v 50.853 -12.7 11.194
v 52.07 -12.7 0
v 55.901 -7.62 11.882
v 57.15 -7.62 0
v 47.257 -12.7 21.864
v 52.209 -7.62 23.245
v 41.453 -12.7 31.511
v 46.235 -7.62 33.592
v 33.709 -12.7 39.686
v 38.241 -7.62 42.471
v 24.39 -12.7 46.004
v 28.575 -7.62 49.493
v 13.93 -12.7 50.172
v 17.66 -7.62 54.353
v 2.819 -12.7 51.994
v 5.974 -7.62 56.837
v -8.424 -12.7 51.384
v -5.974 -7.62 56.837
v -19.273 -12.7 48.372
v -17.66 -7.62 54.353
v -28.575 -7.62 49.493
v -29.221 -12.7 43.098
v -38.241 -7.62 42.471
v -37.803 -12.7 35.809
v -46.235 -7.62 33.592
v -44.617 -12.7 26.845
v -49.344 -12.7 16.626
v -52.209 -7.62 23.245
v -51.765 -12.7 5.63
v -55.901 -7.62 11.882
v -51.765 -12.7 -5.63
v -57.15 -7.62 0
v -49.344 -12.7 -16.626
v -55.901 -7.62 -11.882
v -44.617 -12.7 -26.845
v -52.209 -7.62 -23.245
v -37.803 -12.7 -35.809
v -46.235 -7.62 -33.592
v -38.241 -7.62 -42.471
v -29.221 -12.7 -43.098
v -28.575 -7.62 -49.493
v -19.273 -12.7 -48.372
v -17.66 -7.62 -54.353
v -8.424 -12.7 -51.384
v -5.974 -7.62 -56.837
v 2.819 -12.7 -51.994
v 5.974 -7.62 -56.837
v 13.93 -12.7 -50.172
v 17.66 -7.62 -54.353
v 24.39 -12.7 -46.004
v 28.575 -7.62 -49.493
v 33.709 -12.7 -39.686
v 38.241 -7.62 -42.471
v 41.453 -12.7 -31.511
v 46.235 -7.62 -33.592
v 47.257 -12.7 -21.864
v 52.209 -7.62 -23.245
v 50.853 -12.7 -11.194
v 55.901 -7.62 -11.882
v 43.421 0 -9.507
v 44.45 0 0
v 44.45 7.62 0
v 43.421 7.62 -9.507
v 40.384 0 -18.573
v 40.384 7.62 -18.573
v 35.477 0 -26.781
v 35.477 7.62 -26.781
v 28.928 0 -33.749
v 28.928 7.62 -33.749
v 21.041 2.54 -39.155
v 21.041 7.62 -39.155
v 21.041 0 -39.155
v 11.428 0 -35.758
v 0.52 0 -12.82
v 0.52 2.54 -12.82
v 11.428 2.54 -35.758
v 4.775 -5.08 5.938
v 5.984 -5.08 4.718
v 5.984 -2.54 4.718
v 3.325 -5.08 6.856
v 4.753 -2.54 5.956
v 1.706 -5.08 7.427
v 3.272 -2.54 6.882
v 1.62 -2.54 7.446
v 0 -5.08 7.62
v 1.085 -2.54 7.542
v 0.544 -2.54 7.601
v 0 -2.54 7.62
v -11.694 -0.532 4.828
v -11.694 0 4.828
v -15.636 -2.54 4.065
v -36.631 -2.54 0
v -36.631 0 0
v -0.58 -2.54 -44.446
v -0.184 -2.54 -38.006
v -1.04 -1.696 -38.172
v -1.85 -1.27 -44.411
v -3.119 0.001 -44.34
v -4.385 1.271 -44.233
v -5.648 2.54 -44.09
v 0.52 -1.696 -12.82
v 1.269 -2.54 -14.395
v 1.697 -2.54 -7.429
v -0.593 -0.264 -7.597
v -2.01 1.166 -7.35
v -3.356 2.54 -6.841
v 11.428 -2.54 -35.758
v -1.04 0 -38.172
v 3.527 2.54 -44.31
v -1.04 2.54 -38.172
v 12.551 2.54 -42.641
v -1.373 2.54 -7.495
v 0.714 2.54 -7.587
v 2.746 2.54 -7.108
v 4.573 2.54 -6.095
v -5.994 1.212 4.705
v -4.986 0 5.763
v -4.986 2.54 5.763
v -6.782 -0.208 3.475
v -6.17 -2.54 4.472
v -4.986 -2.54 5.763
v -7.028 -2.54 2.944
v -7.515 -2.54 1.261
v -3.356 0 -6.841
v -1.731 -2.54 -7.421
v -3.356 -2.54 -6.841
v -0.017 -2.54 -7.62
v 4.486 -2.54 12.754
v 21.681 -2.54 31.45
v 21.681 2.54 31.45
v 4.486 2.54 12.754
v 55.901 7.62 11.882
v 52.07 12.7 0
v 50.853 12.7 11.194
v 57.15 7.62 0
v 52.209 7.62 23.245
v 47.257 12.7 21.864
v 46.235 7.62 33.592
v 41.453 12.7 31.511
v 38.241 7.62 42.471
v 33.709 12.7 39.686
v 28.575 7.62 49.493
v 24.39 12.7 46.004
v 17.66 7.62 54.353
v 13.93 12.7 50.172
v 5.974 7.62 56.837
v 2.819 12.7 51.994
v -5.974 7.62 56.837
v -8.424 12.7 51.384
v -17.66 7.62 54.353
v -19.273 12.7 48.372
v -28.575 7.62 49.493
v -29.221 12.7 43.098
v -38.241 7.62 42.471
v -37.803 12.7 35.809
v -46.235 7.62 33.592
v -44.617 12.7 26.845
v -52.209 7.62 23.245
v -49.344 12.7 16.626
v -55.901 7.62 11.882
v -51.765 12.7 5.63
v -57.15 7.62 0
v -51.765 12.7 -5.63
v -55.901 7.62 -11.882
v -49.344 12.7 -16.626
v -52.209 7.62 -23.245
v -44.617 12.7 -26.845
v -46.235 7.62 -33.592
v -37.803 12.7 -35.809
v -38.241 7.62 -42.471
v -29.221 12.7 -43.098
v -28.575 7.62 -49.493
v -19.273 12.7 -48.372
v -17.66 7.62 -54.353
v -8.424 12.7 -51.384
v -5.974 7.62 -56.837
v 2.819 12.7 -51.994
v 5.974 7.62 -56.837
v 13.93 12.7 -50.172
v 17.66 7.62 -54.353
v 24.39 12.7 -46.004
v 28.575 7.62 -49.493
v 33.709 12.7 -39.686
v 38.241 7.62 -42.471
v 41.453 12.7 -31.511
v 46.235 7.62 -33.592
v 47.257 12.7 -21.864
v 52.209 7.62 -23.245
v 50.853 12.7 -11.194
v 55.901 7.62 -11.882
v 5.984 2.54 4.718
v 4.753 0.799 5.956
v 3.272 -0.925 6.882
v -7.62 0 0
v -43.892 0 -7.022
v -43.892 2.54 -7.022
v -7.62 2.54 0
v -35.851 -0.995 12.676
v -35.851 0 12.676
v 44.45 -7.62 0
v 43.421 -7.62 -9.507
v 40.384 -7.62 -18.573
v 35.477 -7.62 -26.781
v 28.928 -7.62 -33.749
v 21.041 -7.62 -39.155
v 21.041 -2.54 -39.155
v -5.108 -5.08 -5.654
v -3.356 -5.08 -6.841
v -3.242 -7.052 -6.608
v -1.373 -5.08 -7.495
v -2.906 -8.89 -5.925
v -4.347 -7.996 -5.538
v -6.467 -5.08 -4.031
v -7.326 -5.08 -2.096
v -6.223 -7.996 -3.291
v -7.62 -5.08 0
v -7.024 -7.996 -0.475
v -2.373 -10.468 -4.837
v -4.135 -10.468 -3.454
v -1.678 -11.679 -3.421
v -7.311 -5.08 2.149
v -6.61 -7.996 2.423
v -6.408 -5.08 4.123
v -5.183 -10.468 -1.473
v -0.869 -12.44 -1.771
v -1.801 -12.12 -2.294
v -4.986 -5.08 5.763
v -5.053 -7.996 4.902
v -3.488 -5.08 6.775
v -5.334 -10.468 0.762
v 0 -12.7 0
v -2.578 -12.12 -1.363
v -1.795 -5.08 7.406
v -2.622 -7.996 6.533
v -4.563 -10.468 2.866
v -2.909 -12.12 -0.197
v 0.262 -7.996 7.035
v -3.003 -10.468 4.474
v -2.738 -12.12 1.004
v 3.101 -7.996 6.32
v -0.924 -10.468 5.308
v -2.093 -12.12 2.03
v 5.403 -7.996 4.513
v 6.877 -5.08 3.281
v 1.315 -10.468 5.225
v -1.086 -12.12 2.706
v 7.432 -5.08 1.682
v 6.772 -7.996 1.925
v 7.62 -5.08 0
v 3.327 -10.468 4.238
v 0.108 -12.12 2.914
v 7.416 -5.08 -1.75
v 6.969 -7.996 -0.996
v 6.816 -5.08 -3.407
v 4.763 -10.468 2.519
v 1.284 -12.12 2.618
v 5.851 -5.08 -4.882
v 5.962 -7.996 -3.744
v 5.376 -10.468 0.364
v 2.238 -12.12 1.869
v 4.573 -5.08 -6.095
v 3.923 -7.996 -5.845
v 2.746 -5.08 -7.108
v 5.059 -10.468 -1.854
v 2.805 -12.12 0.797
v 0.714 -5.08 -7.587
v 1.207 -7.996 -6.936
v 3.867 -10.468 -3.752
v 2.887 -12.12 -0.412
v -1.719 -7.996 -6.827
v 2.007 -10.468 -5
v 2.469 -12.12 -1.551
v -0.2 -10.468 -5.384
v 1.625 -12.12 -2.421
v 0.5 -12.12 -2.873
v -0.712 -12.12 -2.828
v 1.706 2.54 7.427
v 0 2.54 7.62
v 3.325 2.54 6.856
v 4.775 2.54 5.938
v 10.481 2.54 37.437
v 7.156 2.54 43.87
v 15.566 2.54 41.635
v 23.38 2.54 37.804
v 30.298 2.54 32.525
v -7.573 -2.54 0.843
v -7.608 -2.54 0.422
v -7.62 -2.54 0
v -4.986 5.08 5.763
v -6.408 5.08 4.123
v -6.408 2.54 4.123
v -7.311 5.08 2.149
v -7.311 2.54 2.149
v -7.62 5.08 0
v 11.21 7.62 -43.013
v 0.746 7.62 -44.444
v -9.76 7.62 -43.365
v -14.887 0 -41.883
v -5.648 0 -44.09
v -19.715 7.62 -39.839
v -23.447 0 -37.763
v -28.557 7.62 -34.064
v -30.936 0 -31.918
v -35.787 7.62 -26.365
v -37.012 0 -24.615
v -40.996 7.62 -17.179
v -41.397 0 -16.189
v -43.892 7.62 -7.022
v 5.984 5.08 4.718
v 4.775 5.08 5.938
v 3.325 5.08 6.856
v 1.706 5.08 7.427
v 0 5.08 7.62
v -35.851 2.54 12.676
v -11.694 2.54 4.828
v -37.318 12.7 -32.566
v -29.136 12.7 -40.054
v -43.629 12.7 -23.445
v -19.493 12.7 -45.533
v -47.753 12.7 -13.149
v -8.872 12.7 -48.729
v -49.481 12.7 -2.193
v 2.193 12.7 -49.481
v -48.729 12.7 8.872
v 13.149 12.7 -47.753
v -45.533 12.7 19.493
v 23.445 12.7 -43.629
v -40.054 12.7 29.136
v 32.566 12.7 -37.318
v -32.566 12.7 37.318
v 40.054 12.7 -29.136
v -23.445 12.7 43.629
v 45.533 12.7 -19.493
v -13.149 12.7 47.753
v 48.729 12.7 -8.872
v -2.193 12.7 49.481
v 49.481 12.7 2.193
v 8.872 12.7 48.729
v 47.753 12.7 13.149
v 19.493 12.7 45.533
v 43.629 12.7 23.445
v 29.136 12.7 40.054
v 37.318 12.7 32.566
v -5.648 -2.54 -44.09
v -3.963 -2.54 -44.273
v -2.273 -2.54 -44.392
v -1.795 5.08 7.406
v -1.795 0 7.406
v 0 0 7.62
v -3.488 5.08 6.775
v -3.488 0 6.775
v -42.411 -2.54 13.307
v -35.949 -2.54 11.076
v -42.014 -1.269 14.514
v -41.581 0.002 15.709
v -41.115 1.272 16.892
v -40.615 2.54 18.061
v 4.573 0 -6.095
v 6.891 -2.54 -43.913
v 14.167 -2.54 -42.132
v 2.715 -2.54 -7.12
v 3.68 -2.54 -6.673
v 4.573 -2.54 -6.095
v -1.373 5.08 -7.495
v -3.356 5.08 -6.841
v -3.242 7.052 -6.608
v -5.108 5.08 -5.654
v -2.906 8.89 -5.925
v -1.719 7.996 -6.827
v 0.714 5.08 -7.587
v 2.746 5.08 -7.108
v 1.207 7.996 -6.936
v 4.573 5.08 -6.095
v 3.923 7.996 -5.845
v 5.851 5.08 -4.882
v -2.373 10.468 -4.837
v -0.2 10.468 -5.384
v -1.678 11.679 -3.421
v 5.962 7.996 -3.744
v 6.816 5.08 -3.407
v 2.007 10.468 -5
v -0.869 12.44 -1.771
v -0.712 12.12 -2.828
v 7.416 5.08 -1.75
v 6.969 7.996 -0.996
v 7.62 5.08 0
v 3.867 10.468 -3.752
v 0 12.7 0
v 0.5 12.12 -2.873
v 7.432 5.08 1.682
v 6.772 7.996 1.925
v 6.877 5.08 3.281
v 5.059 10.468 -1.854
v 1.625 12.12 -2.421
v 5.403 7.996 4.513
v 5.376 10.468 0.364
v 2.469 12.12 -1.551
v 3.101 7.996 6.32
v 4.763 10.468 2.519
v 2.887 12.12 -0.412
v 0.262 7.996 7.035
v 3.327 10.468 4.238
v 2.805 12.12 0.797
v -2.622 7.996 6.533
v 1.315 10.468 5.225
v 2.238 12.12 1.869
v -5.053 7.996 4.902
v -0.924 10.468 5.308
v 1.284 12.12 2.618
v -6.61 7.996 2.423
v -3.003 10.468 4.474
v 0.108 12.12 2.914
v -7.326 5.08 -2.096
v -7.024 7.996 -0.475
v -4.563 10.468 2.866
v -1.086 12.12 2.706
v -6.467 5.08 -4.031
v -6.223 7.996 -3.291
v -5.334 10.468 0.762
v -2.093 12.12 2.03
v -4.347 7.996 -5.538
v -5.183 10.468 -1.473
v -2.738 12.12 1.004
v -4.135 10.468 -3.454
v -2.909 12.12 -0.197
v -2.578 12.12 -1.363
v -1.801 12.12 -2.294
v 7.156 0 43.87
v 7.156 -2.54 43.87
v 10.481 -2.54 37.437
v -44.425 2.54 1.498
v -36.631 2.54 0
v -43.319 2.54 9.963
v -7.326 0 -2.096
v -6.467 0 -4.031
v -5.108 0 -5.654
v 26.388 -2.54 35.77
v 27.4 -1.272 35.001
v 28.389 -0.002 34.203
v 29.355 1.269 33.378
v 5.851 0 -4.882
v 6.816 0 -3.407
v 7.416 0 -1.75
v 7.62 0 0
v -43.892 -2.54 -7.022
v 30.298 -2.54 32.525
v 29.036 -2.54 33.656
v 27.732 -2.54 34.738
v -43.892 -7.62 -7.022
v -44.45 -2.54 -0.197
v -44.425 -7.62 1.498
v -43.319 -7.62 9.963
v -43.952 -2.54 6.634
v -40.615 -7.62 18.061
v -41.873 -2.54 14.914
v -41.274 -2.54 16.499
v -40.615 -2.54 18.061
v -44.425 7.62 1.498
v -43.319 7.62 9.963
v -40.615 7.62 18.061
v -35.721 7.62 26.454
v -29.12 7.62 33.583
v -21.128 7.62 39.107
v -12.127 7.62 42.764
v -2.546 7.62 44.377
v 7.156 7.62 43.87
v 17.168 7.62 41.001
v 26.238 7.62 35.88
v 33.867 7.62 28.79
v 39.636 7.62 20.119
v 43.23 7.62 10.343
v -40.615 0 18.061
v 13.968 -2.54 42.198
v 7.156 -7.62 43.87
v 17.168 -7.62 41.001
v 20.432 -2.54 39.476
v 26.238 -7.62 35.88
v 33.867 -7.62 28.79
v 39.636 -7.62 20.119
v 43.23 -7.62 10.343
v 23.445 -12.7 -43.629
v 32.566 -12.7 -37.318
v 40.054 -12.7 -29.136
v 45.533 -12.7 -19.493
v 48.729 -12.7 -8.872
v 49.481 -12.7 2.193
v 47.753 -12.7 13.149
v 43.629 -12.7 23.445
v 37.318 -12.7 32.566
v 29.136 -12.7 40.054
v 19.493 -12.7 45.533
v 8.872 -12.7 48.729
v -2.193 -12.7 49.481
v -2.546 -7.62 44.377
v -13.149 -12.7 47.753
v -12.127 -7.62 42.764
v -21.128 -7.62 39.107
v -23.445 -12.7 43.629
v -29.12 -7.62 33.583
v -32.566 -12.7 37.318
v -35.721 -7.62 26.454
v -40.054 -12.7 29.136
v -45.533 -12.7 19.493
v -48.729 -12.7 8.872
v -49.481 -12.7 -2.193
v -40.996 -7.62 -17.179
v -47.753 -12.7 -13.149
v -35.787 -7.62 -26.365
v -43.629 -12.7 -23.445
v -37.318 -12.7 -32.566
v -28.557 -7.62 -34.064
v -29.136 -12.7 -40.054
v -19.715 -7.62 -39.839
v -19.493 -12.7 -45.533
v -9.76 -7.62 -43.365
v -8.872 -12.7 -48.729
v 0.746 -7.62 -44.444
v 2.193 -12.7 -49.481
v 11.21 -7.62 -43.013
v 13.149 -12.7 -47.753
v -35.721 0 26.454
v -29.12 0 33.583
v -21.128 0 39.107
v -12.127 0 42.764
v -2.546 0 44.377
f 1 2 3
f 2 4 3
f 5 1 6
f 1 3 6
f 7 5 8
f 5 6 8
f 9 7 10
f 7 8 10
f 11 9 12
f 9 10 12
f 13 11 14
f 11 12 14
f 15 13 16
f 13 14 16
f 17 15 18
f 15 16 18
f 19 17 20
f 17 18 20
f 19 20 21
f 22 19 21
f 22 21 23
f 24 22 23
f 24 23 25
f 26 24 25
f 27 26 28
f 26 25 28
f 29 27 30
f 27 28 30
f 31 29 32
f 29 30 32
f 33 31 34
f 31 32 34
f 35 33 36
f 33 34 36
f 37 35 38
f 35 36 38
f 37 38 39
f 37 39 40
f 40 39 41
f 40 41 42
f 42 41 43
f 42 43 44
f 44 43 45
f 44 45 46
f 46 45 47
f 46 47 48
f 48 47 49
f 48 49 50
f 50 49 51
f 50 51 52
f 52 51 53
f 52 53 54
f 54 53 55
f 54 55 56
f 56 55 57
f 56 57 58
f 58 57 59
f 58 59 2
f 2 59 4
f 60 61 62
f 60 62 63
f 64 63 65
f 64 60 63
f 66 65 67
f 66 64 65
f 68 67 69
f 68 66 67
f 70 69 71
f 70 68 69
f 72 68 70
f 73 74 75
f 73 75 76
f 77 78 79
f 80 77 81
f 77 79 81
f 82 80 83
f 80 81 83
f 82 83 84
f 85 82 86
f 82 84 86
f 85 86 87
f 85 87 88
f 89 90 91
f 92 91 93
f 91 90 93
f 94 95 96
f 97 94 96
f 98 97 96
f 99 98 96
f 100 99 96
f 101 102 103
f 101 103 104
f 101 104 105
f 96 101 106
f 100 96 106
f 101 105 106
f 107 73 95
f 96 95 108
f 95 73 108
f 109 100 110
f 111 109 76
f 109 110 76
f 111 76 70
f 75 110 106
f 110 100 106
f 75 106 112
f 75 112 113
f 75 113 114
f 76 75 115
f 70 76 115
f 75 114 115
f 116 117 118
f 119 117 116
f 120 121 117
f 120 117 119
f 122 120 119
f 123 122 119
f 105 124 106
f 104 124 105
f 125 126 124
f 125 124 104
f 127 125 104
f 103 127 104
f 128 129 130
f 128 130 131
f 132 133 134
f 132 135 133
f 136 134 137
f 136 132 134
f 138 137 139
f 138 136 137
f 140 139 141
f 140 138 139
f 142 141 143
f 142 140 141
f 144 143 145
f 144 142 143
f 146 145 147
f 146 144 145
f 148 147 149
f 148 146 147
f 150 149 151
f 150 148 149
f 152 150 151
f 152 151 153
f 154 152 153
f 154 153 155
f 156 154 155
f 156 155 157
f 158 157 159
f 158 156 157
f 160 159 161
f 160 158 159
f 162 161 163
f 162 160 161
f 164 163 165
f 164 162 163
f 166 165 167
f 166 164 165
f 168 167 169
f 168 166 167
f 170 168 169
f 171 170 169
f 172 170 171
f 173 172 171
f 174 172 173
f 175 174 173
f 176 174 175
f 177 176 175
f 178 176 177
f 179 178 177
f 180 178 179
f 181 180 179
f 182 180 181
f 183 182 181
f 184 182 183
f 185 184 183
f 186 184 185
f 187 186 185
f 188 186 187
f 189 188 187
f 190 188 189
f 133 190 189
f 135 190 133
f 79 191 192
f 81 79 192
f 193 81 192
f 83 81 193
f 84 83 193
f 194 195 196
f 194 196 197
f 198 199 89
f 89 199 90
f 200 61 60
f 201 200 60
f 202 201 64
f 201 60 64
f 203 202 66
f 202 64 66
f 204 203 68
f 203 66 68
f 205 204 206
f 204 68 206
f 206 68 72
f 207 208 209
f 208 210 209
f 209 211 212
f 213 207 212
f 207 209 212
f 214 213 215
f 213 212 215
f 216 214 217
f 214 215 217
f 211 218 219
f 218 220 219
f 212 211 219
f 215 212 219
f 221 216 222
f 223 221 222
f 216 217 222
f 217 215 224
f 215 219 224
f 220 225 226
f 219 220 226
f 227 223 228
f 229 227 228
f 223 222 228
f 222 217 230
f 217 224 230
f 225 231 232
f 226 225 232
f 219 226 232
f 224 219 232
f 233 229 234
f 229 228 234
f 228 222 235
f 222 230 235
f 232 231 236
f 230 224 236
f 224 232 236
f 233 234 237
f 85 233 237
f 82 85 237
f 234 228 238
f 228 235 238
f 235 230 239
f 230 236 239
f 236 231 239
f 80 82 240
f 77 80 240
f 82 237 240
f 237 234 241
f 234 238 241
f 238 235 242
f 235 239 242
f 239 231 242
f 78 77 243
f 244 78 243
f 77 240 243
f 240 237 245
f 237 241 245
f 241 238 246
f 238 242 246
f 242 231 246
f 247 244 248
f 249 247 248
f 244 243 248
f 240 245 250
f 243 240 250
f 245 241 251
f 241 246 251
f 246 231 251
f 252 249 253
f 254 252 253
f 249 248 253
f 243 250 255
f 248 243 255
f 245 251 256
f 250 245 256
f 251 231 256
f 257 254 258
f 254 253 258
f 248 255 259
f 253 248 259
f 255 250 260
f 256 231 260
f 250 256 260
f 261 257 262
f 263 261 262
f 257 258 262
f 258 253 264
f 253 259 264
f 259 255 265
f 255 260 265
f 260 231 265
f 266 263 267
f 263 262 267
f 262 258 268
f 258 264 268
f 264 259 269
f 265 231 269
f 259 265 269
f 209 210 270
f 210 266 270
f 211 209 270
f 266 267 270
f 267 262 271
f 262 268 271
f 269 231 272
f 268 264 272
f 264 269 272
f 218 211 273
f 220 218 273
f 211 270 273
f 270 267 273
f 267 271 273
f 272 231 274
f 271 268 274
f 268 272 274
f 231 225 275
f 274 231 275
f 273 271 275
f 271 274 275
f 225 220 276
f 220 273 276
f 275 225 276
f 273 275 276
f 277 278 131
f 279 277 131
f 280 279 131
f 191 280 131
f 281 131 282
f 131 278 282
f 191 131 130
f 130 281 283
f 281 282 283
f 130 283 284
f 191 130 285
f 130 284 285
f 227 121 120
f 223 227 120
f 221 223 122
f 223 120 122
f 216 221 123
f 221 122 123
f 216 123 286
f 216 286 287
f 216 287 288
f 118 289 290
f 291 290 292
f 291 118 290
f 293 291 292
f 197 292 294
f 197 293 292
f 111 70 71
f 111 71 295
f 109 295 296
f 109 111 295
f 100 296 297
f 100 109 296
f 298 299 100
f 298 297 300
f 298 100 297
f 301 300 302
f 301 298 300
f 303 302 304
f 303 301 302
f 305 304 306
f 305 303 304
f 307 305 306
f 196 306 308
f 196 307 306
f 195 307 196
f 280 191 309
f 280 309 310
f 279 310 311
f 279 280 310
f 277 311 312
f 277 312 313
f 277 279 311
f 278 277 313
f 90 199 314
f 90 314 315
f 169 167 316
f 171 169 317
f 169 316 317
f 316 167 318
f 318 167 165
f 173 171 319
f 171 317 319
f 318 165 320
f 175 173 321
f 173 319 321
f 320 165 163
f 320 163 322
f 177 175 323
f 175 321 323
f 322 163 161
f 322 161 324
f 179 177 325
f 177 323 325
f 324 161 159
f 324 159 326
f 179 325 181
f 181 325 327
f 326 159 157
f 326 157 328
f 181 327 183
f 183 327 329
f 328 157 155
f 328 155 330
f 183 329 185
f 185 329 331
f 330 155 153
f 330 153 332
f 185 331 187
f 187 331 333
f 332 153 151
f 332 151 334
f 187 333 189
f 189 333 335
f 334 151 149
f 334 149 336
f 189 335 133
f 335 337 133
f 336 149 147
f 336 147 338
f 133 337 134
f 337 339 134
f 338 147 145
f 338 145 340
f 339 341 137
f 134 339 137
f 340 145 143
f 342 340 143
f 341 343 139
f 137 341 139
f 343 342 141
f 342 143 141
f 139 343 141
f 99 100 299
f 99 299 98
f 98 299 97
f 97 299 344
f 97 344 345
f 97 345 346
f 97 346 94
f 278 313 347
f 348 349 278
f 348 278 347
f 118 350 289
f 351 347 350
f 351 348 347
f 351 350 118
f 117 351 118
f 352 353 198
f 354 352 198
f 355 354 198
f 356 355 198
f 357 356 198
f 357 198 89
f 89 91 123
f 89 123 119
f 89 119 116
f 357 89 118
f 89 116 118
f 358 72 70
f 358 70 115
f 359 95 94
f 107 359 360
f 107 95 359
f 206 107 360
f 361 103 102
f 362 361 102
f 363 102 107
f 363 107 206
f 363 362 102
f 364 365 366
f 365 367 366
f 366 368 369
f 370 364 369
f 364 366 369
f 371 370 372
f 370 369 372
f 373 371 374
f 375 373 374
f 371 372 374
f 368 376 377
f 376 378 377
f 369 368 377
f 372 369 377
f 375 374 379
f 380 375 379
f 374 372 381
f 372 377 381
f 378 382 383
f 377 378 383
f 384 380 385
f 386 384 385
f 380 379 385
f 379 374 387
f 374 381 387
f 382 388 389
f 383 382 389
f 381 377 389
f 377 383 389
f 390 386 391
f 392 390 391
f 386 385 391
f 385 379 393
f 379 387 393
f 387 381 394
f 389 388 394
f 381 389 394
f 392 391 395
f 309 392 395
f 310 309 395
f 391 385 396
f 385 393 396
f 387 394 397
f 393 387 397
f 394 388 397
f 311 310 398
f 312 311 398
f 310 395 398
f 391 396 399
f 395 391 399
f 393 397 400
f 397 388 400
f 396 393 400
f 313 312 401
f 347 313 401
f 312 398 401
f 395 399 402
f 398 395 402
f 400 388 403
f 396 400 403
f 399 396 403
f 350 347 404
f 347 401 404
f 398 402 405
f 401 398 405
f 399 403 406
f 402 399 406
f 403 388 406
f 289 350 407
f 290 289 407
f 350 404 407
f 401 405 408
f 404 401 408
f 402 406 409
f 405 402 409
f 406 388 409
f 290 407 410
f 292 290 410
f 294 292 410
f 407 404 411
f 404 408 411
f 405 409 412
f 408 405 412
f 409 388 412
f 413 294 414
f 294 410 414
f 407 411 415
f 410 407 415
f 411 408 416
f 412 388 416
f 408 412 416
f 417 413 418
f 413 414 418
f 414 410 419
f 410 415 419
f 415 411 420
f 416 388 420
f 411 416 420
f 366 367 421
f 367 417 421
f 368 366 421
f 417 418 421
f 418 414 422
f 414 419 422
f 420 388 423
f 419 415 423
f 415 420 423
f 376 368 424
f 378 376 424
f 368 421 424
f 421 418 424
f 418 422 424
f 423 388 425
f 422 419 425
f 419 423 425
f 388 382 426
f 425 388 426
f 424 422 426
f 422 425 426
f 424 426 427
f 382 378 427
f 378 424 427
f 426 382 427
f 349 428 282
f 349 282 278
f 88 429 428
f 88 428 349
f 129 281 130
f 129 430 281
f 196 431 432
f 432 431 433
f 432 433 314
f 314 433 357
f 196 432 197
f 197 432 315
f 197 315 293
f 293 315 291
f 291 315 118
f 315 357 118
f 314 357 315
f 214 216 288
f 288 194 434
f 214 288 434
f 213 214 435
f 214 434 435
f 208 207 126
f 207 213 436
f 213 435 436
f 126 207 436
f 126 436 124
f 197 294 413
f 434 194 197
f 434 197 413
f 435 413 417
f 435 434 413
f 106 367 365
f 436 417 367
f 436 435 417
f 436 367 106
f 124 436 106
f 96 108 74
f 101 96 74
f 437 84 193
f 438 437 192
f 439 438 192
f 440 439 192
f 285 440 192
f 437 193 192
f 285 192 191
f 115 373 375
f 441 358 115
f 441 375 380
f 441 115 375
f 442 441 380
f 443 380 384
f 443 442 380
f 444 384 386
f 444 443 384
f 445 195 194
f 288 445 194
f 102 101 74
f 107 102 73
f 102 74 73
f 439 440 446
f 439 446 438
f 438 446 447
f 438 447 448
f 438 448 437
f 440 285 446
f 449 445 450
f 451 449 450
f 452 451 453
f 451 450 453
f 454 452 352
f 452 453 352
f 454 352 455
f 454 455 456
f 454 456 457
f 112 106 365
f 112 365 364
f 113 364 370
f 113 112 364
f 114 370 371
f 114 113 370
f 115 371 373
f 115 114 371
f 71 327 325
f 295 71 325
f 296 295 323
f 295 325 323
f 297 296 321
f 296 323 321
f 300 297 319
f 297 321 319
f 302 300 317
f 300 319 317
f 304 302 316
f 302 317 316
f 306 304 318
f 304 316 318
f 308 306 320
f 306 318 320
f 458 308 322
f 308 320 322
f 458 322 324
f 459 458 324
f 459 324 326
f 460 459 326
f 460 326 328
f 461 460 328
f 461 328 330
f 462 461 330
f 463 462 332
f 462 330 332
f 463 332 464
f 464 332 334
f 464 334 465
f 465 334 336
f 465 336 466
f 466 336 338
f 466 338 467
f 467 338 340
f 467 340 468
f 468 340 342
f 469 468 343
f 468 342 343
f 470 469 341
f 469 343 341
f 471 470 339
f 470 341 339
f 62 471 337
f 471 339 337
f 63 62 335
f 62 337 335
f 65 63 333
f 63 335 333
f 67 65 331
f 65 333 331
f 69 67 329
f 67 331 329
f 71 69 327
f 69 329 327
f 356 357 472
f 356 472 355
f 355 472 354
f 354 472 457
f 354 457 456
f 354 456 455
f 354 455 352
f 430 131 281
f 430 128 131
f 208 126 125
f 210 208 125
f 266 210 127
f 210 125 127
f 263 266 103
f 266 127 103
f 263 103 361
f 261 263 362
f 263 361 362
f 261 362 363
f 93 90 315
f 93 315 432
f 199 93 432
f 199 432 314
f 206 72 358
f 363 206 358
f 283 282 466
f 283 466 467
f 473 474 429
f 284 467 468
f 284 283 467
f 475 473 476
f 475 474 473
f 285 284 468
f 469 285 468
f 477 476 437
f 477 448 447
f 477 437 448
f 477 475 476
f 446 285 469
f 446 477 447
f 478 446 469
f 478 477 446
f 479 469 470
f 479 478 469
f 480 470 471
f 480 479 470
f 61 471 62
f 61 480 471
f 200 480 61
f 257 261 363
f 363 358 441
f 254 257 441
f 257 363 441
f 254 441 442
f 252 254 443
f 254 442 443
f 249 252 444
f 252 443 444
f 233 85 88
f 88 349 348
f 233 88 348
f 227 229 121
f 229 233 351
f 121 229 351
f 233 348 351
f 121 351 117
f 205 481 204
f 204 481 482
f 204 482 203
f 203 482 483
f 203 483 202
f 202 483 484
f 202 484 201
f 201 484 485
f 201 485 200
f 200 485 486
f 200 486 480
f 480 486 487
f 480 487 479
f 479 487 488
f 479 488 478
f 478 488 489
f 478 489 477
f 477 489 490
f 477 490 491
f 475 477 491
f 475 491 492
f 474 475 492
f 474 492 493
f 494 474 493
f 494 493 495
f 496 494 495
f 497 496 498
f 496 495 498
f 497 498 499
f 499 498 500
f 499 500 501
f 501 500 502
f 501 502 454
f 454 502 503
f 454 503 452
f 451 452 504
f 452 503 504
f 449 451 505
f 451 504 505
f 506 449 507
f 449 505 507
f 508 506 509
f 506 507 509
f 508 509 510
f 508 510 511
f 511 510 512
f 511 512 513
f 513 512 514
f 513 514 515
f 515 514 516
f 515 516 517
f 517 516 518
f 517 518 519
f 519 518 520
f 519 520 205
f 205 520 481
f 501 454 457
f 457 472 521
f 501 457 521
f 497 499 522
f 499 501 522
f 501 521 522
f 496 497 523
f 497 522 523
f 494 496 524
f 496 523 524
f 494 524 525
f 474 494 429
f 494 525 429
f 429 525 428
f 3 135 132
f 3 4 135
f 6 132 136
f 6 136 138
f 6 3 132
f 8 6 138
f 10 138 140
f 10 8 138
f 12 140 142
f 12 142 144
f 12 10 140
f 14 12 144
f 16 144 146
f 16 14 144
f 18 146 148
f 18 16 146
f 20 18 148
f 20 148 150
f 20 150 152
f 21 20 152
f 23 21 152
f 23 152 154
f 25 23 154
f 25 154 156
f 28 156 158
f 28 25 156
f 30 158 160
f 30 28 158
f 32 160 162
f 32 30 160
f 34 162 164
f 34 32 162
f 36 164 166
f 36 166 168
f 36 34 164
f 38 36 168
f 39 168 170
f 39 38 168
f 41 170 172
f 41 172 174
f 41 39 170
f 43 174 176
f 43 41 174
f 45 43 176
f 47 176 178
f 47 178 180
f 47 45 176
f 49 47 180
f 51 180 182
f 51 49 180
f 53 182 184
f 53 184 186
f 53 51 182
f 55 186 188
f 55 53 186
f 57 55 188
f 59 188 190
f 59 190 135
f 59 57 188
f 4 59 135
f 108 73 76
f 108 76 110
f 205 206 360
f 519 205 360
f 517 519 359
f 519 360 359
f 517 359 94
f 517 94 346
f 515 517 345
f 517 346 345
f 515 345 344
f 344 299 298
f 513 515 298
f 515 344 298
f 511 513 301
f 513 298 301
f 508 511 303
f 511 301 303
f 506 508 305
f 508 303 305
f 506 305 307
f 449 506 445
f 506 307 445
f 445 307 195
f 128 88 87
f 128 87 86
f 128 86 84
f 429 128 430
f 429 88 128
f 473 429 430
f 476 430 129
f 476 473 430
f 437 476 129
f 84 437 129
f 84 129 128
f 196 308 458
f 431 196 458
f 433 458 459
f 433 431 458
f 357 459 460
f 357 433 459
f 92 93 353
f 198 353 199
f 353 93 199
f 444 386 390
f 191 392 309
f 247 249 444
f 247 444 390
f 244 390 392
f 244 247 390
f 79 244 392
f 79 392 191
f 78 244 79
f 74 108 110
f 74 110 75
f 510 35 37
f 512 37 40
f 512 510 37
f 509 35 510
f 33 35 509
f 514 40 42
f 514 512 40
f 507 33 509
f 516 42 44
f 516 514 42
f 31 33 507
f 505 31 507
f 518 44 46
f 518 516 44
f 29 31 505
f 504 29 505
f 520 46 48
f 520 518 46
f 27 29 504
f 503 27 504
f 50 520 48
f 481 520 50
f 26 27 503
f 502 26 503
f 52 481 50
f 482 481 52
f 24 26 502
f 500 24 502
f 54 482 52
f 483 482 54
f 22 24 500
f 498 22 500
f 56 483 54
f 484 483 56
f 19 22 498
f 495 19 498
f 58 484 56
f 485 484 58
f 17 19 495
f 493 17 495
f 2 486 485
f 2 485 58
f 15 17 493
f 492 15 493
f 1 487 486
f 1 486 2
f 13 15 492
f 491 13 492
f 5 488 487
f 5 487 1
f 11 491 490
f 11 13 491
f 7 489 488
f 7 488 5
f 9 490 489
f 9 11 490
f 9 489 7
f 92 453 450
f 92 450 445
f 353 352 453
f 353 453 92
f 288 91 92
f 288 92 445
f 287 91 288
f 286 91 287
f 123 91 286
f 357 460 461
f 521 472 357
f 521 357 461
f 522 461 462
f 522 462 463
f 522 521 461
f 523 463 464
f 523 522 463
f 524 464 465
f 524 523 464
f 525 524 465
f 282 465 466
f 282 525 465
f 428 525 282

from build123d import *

# Parameters (mm, degrees)
F0_R          = 57.15
F1_DEPTH      = 12.7
F1_DEPTH_BACK = 12.7
F2_DEPTH      = 2.54
F2_DEPTH_BACK = 2.54
F4_T3_DEPTH   = 63.8207499086
F4_S4_R       = 7.62
F4_T5_DEPTH   = 35
F4_S6_R       = 44.45
F4_T7_DEPTH   = 35
F4_T10_DEPTH  = 63.0657347927
F4_S11_R      = 7.62
F4_T12_DEPTH  = 36
F4_S13_R      = 44.45
F4_T14_DEPTH  = 36
F4_T17_DEPTH  = 63.4473233417
F4_S18_R      = 7.62
F4_T19_DEPTH  = 34
F4_S20_R      = 44.45
F4_T21_DEPTH  = 34


# Not quite as in the source:
# - a fillet or chamfer that OpenCascade refuses, or shapes differently, is made with other operations: its cross-section is extruded or revolved along the edge and cut away or added


with BuildPart() as f1:
    # F0 (on Front) → F1 (new body, two sides)
    with BuildSketch(Plane.XZ) as f1_sk:
        Circle(F0_R)
        with BuildLine():
            ThreePointArc((30.2978338322, 32.5245102204), (40.7586875024, 17.7350470278), (44.45, 0))
            ThreePointArc((44.45, 0), (38.1514443262, -22.8094233996), (21.0407853398, -39.1546657793))
            ThreePointArc((21.0407853398, -39.1546657793), (8.0824234514, -43.7090028616), (-5.6476952972, -44.0897498046))
            ThreePointArc((-5.6476952972, -44.0897498046), (-30.9360762044, -31.9180464483), (-43.8918074796, -7.0222315665))
            ThreePointArc((-43.8918074796, -7.0222315665), (-44.0755738858, 5.7572811841), (-40.6153867658, 18.0608100003))
            ThreePointArc((-40.6153867658, 18.0608100003), (-21.1284803601, 39.1074138454), (7.15605679, 43.8701874992))
            ThreePointArc((7.15605679, 43.8701874992), (19.5673089339, 39.9114384743), (30.2978338322, 32.5245102204))
        make_face(mode=Mode.SUBTRACT)
    extrude(amount=F1_DEPTH)
    extrude(f1_sk.sketch, amount=-F1_DEPTH_BACK)



with BuildPart() as f1b:
    # F0 (on Front) → F1, piece 2 (new body, two sides)
    with BuildSketch(Plane.XZ) as f1_2_sk:
        with BuildLine():
            ThreePointArc((7.62, 0), (7.1992672661, 2.4969883522), (5.9835299656, 4.7182379285))
            ThreePointArc((5.9835299656, 4.7182379285), (3.3250133071, 6.8562880998), (0, 7.62))
            ThreePointArc((0, 7.62), (-2.66023415, 7.1405569998), (-4.9857096013, 5.7625601751))
            ThreePointArc((-4.9857096013, 5.7625601751), (-6.930205883, 3.168066669), (-7.62, 0))
            ThreePointArc((-7.62, 0), (-6.4667392377, -4.030593459), (-3.3560410415, -6.8411540348))
            ThreePointArc((-3.3560410415, -6.8411540348), (0.7135883563, -7.5865138013), (4.5728511754, -6.0953615256))
            ThreePointArc((4.5728511754, -6.0953615256), (6.815773102, -3.407291743), (7.62, 0))
        make_face()
    extrude(amount=F1_DEPTH)
    extrude(f1_2_sk.sketch, amount=-F1_DEPTH_BACK)


with BuildPart() as f1_1:
    add(f1.part)

    add(f1b.part)  # F2 merges F1b
    # F0 (on Front) → F2 (join, two sides)
    with BuildSketch(Plane.XZ) as f2_sk:
        with BuildLine():
            Line((5.9835299656, 4.7182379285), (30.2978338322, 32.5245102204))
            ThreePointArc((30.2978338322, 32.5245102204), (19.5673089339, 39.9114384743), (7.15605679, 43.8701874992))
            Line((7.15605679, 43.8701874992), (0, 7.62))
            ThreePointArc((0, 7.62), (3.3250133071, 6.8562880998), (5.9835299656, 4.7182379285))
        make_face()
        Polygon((21.6807832905, 31.4497899136), (4.4864523225, 12.7544701099), (10.4806591381, 37.4370446242), align=None, mode=Mode.SUBTRACT)
        with BuildLine():
            Line((-4.9857096013, 5.7625601751), (-40.6153867658, 18.0608100003))
            ThreePointArc((-40.6153867658, 18.0608100003), (-44.0755738858, 5.7572811841), (-43.8918074796, -7.0222315665))
            Line((-43.8918074796, -7.0222315665), (-7.62, 0))
            ThreePointArc((-7.62, 0), (-6.930205883, 3.168066669), (-4.9857096013, 5.7625601751))
        make_face()
        Polygon((-35.8506757944, 12.6760325764), (-11.6935795524, 4.8278034033), (-36.6305463748, 0), align=None, mode=Mode.SUBTRACT)
        with BuildLine():
            ThreePointArc((-5.6476952972, -44.0897498046), (8.0824234514, -43.7090028616), (21.0407853398, -39.1546657793))
            Line((21.0407853398, -39.1546657793), (4.5728511754, -6.0953615256))
            ThreePointArc((4.5728511754, -6.0953615256), (0.7135883563, -7.5865138013), (-3.3560410415, -6.8411540348))
            Line((-3.3560410415, -6.8411540348), (-5.6476952972, -44.0897498046))
        make_face()
        Polygon((-1.0400637192, -38.1721799109), (0.5196774415, -12.8201147581), (11.428419692, -35.7582782093), align=None, mode=Mode.SUBTRACT)
    extrude(amount=F2_DEPTH)
    extrude(f2_sk.sketch, amount=-F2_DEPTH_BACK)

    # F3: fillet of radius 7.62 on 2 edges, made by hand

    # F3_s1 → F3_t2 (revolve, cut)
    with BuildSketch(Plane(origin=(0, 0, 0), x_dir=(0, 1, 0), z_dir=(0.8977892434, 0, -0.4404253335))):
        with BuildLine():
            ThreePointArc((-5.08, -7.62), (-10.4681536726, -5.3881536726), (-12.7, 0))
            Line((-12.7, 0), (-12.7, -7.62))
            Line((-12.7, -7.62), (-5.08, -7.62))
        make_face()
    revolve(axis=Axis((0, -12.7, 0), (0, 1, 0)), mode=Mode.SUBTRACT)

    # F3_s3 → F3_t4 (revolve, cut)
    with BuildSketch(Plane(origin=(0, 0, 0), x_dir=(0, 1, 0), z_dir=(-0.8977892434, 0, 0.4404253335))):
        with BuildLine():
            ThreePointArc((5.08, 7.62), (10.4681536726, 5.3881536726), (12.7, 0))
            Line((12.7, 0), (12.7, 7.62))
            Line((12.7, 7.62), (5.08, 7.62))
        make_face()
    revolve(axis=Axis((0, 12.7, 0), (0, -1, 0)), mode=Mode.SUBTRACT)

    # F4: chamfer of 5.08 on 7 edges, made by hand


with BuildPart() as f4_tool1:
    # F4_s2 → F4_t3 (new body)
    with BuildSketch(Plane(origin=(6.116948919, 0, -2.1113793882), x_dir=(0, 1, 0), z_dir=(-0.9452735615, 0, 0.326278859))):
        Polygon((-2.54, 1.2595358599), (2.54, -3.8204641401), (-2.54, -3.8204641401), align=None)
    extrude(amount=F4_T3_DEPTH)

    # F4_s4 → F4_t5 (cut, symmetric)
    with BuildSketch(Plane.XZ):
        Circle(F4_S4_R)
    extrude(amount=F4_T5_DEPTH, both=True, mode=Mode.SUBTRACT)

    # F4_s6 → F4_t7 (intersect, symmetric)
    with BuildSketch(Plane.XZ):
        Circle(F4_S6_R)
    extrude(amount=F4_T7_DEPTH, both=True, mode=Mode.INTERSECT)


with BuildPart() as f4_tool8:
    # F4_s9 → F4_t10 (new body)
    with BuildSketch(Plane(origin=(-3.6688529254, 0, -4.1957657518), x_dir=(0, 1, 0), z_dir=(0.6582564125, 0, 0.7527937934))):
        Polygon((-2.54, 3.6814461509), (2.54, -1.3985538491), (-2.54, -1.3985538491), align=None)
    extrude(amount=F4_T10_DEPTH)

    # F4_s11 → F4_t12 (cut, symmetric)
    with BuildSketch(Plane.XZ):
        Circle(F4_S11_R)
    extrude(amount=F4_T12_DEPTH, both=True, mode=Mode.SUBTRACT)

    # F4_s13 → F4_t14 (intersect, symmetric)
    with BuildSketch(Plane.XZ):
        Circle(F4_S13_R)
    extrude(amount=F4_T14_DEPTH, both=True, mode=Mode.INTERSECT)


with BuildPart() as f4_tool15:
    # F4_s16 → F4_t17 (new body)
    with BuildSketch(Plane(origin=(0.3702740347, 0, 6.0184418339), x_dir=(0, 1, 0), z_dir=(-0.0614071323, 0, -0.9981128013))):
        Polygon((-2.54, 2.1503881258), (2.54, -2.9296118742), (-2.54, -2.9296118742), align=None)
    extrude(amount=F4_T17_DEPTH)

    # F4_s18 → F4_t19 (cut, symmetric)
    with BuildSketch(Plane.XZ):
        Circle(F4_S18_R)
    extrude(amount=F4_T19_DEPTH, both=True, mode=Mode.SUBTRACT)

    # F4_s20 → F4_t21 (intersect, symmetric)
    with BuildSketch(Plane.XZ):
        Circle(F4_S20_R)
    extrude(amount=F4_T21_DEPTH, both=True, mode=Mode.INTERSECT)


with BuildPart() as f4_tool22:
    # F4_s23 → F4_t24 (revolve)
    with BuildSketch(Plane(origin=(0, 0, 0), x_dir=(0, 1, 0), z_dir=(-0.8808698713, 0, -0.4733585003))):
        Polygon((-7.62, 44.45), (-12.7, 49.53), (-12.7, 44.45), align=None)
    revolve(axis=Axis((0, -12.7, 0), (0, -1, 0)))


with BuildPart() as f4_tool25:
    # F4_s26 → F4_t27 (revolve)
    with BuildSketch(Plane(origin=(0, 0, 0), x_dir=(0, 1, 0), z_dir=(0.8808698713, 0, 0.4733585003))):
        Polygon((7.62, -44.45), (12.7, -49.53), (12.7, -44.45), align=None)
    revolve(axis=Axis((0, 12.7, 0), (0, 1, 0)))


with BuildPart() as f4_tool28:
    # F4_s29 → F4_t30 (revolve)
    with BuildSketch(Plane.XY):
        Polygon((52.07, 12.7), (57.15, 7.62), (57.15, 12.7), align=None)
    revolve(axis=Axis((0, 12.7, 0), (0, -1, 0)))


with BuildPart() as f4_tool31:
    # F4_s32 → F4_t33 (revolve)
    with BuildSketch(Plane.XY):
        Polygon((52.07, -12.7), (57.15, -7.62), (57.15, -12.7), align=None)
    revolve(axis=Axis((0, -12.7, 0), (0, -1, 0)))


with BuildPart() as f1_2:
    add(f1_1.part)

    # F4_t34: cut F4_tool1, F4_tool8, F4_tool15, F4_tool22, F4_tool25, F4_tool28, F4_tool31
    add([f4_tool1.part, f4_tool8.part, f4_tool15.part, f4_tool22.part, f4_tool25.part, f4_tool28.part, f4_tool31.part], mode=Mode.SUBTRACT)


solid = f1_2.part
